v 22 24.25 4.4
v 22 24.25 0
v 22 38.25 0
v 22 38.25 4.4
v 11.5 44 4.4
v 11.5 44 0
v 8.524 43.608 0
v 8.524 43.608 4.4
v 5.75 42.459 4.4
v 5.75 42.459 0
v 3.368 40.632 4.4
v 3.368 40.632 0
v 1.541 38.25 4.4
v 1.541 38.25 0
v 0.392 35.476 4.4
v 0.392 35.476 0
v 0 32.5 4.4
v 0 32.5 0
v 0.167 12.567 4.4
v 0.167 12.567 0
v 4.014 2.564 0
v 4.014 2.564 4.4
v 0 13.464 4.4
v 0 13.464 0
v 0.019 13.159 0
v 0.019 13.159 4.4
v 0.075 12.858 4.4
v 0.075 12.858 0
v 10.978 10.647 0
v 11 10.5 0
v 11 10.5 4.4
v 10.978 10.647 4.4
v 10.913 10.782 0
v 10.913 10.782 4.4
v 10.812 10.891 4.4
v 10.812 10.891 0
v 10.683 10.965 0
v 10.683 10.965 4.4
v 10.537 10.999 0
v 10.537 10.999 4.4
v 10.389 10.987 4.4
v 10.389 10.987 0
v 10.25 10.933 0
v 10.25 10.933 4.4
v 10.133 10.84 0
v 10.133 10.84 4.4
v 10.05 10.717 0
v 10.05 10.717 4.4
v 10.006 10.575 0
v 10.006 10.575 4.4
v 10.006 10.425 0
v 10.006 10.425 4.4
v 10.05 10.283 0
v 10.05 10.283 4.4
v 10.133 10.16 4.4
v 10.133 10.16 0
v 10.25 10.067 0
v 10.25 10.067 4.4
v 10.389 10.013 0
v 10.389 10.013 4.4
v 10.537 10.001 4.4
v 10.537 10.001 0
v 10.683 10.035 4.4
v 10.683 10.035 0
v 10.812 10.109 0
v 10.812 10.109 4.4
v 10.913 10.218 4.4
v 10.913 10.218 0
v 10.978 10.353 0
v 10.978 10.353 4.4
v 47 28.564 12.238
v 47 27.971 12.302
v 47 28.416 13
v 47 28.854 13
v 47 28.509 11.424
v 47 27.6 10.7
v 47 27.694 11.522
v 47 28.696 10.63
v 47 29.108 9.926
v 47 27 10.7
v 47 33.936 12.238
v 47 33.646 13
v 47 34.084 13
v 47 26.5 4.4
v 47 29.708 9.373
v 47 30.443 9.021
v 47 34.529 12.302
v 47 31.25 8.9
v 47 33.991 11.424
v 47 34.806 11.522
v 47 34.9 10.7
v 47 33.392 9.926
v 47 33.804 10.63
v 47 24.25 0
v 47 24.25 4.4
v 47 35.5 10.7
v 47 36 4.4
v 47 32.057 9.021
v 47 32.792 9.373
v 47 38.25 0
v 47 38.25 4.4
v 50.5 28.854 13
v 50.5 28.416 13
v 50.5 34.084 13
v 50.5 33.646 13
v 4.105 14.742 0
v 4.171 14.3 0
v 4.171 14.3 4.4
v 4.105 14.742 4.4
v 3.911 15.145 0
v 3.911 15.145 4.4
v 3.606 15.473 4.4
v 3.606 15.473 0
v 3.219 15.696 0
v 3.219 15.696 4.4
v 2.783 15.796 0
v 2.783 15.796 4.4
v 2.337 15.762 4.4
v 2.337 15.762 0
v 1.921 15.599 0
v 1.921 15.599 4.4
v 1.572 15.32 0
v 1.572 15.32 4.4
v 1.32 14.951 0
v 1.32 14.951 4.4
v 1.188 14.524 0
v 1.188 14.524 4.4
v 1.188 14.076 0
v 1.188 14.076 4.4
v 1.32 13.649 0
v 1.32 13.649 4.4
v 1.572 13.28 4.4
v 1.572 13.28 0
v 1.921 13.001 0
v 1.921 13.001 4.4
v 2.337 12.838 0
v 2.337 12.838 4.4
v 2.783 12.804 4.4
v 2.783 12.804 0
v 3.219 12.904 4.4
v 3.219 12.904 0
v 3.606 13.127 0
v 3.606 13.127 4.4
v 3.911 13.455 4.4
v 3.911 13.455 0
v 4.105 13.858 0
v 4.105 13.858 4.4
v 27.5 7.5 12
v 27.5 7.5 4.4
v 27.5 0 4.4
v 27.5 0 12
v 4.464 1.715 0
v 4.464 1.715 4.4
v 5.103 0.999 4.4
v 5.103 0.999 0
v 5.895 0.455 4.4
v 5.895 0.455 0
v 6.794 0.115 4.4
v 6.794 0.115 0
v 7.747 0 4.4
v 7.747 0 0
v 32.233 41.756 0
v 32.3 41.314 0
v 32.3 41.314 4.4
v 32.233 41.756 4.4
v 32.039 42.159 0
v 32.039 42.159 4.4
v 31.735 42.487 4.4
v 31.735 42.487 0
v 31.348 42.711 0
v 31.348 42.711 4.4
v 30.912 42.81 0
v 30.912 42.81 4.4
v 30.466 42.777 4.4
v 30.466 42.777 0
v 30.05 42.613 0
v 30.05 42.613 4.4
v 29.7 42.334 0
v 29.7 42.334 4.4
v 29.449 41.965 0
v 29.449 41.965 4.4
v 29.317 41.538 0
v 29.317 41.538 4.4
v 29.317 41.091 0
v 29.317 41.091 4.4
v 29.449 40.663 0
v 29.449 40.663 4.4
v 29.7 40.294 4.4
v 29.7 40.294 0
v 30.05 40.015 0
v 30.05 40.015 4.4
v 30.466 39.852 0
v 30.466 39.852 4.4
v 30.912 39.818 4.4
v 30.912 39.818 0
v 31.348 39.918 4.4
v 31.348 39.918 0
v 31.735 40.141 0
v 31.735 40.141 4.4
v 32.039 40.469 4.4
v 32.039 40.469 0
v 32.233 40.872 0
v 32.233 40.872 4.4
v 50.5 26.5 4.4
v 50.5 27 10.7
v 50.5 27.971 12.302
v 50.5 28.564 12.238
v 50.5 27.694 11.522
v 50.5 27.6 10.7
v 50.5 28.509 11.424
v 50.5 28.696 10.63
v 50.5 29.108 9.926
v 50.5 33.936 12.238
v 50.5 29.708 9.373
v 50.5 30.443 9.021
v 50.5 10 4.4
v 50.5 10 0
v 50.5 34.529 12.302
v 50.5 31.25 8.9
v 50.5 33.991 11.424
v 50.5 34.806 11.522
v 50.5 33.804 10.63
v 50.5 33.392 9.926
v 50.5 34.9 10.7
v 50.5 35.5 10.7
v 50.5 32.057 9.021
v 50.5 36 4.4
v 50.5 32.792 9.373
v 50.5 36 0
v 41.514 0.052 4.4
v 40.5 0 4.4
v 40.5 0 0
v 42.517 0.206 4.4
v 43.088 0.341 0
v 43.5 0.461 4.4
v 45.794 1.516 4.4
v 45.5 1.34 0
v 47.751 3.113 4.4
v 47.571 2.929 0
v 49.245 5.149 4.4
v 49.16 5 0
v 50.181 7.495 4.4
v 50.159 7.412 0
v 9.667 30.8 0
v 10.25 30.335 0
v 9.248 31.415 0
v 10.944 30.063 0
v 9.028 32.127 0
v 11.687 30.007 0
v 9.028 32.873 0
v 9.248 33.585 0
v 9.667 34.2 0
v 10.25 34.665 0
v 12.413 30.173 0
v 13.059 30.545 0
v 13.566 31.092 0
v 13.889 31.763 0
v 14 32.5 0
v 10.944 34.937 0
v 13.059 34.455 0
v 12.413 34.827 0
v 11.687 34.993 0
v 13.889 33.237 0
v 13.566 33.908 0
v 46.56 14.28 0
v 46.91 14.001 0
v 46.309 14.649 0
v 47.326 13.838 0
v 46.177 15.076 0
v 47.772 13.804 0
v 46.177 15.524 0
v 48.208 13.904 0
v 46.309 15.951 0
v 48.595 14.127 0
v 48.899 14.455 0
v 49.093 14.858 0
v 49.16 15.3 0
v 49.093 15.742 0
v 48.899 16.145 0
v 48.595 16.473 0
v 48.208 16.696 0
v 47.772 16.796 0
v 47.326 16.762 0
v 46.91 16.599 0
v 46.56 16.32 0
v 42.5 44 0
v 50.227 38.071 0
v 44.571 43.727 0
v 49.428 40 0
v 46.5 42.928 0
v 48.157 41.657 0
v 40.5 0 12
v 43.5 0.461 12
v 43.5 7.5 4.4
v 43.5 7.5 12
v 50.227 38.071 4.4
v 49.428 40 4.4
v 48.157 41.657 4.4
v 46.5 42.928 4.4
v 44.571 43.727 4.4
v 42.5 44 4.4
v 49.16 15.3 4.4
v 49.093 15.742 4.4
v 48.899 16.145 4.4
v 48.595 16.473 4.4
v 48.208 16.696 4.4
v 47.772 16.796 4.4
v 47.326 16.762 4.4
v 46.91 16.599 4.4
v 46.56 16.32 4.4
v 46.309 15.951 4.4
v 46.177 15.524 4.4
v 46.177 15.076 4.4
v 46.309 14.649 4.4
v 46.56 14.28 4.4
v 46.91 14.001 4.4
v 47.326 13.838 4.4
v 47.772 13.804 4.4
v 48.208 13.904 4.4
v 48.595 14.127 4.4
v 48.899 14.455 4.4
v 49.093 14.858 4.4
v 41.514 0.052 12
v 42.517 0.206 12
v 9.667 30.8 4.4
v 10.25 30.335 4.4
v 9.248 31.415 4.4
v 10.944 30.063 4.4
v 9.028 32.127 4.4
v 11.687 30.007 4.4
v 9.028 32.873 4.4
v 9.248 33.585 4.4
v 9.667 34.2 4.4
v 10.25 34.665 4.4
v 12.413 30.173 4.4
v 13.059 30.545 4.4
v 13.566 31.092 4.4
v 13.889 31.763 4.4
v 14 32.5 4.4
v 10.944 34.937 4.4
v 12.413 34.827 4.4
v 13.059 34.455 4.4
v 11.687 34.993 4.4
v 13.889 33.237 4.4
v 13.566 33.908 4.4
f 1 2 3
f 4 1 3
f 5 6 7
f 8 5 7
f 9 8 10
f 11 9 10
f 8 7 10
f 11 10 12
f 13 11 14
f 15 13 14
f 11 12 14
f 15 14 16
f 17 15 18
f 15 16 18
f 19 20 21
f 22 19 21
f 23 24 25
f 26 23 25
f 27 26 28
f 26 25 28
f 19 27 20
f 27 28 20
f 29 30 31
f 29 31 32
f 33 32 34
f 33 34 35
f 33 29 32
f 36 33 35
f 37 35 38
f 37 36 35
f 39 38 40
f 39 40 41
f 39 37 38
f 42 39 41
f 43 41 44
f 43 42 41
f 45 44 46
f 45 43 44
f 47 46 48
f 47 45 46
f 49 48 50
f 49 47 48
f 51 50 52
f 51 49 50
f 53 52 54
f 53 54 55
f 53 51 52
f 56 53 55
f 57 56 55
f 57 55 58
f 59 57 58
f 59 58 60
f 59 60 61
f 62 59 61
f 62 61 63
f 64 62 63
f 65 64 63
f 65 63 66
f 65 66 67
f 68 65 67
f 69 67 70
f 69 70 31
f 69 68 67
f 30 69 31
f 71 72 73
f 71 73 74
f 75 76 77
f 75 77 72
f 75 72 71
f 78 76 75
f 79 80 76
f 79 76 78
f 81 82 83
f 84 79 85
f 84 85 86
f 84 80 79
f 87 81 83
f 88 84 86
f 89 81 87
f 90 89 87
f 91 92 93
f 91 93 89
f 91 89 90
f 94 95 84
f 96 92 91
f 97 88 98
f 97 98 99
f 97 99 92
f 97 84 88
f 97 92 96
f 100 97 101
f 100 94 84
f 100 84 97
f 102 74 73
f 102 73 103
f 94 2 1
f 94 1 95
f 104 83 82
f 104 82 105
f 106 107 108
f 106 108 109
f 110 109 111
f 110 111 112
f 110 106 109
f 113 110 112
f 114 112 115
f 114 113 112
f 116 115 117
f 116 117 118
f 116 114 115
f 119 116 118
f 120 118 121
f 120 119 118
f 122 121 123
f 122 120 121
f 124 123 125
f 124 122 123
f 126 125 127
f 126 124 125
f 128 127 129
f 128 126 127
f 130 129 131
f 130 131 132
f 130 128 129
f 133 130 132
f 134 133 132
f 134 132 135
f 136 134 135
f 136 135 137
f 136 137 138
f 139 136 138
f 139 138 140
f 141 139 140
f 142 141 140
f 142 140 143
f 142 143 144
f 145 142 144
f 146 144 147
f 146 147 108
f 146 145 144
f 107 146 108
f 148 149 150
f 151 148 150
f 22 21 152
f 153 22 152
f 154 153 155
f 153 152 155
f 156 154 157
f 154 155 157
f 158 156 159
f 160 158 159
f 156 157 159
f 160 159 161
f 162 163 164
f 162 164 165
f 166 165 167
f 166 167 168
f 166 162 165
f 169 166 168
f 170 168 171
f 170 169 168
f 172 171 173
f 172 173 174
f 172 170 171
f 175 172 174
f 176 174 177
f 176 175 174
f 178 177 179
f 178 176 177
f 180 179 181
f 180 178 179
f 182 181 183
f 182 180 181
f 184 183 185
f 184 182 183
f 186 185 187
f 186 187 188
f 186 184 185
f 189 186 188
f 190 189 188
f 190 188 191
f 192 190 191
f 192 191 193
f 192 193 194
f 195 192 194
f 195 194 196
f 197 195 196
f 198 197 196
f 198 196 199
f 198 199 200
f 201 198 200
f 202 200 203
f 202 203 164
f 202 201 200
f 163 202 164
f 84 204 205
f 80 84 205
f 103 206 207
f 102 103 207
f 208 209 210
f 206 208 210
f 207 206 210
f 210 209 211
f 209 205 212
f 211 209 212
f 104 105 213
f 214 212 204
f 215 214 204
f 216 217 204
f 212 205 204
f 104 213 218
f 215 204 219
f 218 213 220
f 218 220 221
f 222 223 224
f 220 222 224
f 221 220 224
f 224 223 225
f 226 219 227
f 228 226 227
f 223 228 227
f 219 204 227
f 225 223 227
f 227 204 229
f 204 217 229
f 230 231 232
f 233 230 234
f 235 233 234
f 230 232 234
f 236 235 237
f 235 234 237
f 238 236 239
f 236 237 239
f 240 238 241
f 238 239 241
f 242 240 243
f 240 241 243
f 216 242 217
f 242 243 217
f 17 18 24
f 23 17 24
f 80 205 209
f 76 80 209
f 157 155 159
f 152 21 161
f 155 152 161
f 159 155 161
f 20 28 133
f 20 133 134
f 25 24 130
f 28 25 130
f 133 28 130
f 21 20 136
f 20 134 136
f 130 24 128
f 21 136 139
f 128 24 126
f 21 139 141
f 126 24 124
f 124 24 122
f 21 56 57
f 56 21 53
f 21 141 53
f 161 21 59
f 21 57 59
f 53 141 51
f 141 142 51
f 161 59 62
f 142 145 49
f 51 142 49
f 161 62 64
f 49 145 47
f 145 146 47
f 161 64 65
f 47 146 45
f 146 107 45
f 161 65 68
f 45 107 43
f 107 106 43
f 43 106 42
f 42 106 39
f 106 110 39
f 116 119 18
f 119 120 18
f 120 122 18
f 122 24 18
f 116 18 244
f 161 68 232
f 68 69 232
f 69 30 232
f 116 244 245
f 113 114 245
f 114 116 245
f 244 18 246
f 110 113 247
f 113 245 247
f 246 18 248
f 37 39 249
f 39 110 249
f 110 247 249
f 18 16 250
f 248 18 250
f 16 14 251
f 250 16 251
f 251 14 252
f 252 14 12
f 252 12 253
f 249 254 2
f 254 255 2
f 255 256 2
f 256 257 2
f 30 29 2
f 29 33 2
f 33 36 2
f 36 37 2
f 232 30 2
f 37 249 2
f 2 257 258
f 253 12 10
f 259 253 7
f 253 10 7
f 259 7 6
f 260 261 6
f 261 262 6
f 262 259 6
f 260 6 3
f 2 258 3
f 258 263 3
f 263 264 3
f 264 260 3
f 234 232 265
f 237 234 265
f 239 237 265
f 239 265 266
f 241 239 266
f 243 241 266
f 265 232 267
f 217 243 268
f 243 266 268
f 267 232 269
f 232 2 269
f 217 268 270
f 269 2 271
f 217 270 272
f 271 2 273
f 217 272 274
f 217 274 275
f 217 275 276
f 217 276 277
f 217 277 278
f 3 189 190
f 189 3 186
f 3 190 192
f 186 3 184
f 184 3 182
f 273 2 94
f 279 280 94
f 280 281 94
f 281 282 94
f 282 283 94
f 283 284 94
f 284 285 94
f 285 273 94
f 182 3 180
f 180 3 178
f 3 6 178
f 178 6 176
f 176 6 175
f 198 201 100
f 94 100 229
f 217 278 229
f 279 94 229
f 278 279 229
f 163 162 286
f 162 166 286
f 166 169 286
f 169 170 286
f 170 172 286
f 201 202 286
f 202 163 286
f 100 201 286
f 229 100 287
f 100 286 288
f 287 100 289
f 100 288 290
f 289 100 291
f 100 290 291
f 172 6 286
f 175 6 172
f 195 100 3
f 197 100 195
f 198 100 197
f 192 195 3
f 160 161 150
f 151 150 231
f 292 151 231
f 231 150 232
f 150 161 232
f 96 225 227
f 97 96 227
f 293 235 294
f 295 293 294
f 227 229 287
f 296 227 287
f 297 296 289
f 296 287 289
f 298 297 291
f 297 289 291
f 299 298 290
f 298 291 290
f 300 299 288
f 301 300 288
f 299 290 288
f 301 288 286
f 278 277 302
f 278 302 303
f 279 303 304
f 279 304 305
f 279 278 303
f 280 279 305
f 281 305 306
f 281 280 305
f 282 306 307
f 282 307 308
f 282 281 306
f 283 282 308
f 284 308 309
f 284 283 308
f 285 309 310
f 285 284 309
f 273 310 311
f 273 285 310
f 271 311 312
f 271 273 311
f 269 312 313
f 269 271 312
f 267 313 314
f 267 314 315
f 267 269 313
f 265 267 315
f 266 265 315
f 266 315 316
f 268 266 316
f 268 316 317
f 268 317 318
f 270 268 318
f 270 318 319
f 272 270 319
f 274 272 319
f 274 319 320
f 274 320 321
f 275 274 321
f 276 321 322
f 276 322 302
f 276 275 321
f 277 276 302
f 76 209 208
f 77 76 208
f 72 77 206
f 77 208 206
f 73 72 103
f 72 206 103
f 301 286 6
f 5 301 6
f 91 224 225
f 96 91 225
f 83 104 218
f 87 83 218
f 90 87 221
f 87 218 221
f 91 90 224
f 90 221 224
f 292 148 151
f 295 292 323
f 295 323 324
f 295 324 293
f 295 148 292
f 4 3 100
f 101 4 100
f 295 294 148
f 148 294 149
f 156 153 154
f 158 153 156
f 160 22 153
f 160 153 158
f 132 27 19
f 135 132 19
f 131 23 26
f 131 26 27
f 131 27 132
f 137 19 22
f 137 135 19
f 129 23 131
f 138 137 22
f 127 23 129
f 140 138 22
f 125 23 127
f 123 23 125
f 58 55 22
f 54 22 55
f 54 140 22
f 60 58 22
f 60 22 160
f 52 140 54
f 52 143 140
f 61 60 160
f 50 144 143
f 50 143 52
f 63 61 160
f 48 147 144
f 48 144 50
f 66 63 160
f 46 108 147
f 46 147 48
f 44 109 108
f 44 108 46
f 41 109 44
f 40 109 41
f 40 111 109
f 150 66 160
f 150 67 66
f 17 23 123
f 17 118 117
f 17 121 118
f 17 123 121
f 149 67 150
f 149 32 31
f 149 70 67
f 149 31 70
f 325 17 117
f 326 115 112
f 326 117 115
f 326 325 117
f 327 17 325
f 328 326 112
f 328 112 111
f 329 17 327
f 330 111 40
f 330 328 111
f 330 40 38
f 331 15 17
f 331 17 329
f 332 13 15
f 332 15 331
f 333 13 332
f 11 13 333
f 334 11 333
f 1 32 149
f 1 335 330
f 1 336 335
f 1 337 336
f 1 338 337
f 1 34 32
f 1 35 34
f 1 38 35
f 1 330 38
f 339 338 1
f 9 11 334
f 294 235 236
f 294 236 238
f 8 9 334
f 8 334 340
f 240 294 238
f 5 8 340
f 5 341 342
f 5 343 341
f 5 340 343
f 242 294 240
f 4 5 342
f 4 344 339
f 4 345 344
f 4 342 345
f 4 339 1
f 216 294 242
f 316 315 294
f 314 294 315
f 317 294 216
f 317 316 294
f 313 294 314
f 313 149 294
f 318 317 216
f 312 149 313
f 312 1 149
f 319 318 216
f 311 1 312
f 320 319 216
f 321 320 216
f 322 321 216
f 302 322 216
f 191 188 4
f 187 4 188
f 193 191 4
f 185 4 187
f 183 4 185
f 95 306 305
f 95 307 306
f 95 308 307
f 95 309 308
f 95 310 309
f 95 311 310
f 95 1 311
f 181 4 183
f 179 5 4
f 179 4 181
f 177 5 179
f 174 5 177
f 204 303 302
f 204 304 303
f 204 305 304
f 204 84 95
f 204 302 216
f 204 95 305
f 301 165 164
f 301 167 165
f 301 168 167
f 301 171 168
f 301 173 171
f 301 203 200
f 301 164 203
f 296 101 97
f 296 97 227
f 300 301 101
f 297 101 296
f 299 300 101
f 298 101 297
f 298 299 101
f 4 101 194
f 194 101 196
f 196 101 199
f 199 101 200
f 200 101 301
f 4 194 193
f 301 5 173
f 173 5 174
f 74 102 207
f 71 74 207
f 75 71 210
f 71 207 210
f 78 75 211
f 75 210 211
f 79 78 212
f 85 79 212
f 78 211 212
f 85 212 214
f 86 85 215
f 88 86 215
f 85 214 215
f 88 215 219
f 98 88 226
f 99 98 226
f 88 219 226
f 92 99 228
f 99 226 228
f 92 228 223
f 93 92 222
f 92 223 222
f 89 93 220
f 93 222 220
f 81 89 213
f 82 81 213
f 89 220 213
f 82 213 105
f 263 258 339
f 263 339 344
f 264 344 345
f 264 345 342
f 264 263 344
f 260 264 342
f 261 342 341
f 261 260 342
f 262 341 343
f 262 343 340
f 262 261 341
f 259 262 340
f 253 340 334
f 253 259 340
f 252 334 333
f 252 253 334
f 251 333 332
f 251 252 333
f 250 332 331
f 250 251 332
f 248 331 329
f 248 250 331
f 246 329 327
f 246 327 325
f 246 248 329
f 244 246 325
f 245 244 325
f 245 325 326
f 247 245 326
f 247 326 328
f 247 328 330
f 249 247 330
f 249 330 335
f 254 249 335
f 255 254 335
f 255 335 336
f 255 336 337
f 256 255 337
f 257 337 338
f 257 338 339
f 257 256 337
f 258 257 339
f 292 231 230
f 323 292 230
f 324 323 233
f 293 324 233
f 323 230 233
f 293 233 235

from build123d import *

# Parameters (mm, degrees)
F0_R     = 0.5
F0_R_2   = 1.5
F0_R_3   = 2.5
F0_W     = 25
F0_H     = 14
F1_DEPTH = 4.4
F2_W     = 3.5
F2_H     = 9.5
F3_DEPTH = 8.6
F5_DEPTH = 3.5
F7_DEPTH = 7.6


with BuildPart() as f1:
    # F0 (on Top) → F1 (new body)
    with BuildSketch(Plane.XY):
        with BuildLine():
            Line((42.5, 44), (11.5, 44))
            ThreePointArc((11.5, 44), (3.368272, 40.631728), (0, 32.5))
            Line((0, 32.5), (0, 13.464194))
            ThreePointArc((0, 13.464194), (0.042012, 13.007801), (0.166636, 12.566746))
            Line((0.166636, 12.566746), (4.013814, 2.564084))
            ThreePointArc((4.013814, 2.564084), (5.482651, 0.702754), (7.747196, 0))
            Line((7.747196, 0), (40.5, 0))
            ThreePointArc((40.5, 0), (47.571068, 2.928932), (50.5, 10))
            Line((50.5, 10), (50.5, 36))
            ThreePointArc((50.5, 36), (48.156854, 41.656854), (42.5, 44))
        make_face()
        with Locations((10.5, 10.5)):
            Circle(F0_R, mode=Mode.SUBTRACT)
        with Locations((2.671147, 14.3)):
            Circle(F0_R_2, mode=Mode.SUBTRACT)
        with Locations((47.660035, 15.3)):
            Circle(F0_R_2, mode=Mode.SUBTRACT)
        with Locations((11.5, 32.5)):
            Circle(F0_R_3, mode=Mode.SUBTRACT)
        with Locations((34.5, 31.25)):
            Rectangle(F0_W, F0_H, mode=Mode.SUBTRACT)
        with Locations((30.8, 41.314212)):
            Circle(F0_R_2, mode=Mode.SUBTRACT)
    extrude(amount=F1_DEPTH)

    # F2 (on face) → F3 (join)
    with BuildSketch(Plane.XY.offset(4.4)):
        with Locations((48.75, 31.25)):
            Rectangle(F2_W, F2_H)
    extrude(amount=F3_DEPTH)

    # F4 (on face) → F5 (cut, through all)
    with BuildSketch(Plane.YZ.offset(50.5)):
        with BuildLine():
            Line((33.64583, 13), (28.85417, 13))
            ThreePointArc((28.85417, 13), (31.25, 8.9), (33.64583, 13))
        make_face()
        with BuildLine():
            Line((26.5, 13), (26.5, 4.4))
            Line((26.5, 4.4), (27, 10.7))
            Line((27, 10.7), (27.6, 10.7))
            ThreePointArc((27.6, 10.7), (27.809999, 11.920203), (28.415833, 13))
            Line((28.415833, 13), (26.5, 13))
        make_face()
        with BuildLine():
            ThreePointArc((34.084167, 13), (34.690001, 11.920203), (34.9, 10.7))
            Line((34.9, 10.7), (35.5, 10.7))
            Line((35.5, 10.7), (36, 4.4))
            Line((36, 4.4), (36, 13))
            Line((36, 13), (34.084167, 13))
        make_face()
    extrude(amount=-F5_DEPTH, mode=Mode.SUBTRACT)

    # F6 (on face) → F7 (join)
    with BuildSketch(Plane.XY.offset(4.4)):
        with BuildLine():
            Line((27.5, 7.5), (27.5, 0))
            Line((27.5, 0), (40.5, 0))
            ThreePointArc((40.5, 0), (42.017577, 0.115823), (43.5, 0.460608))
            Line((43.5, 0.460608), (43.5, 7.5))
            Line((43.5, 7.5), (27.5, 7.5))
        make_face()
    extrude(amount=F7_DEPTH)


solid = f1.part
